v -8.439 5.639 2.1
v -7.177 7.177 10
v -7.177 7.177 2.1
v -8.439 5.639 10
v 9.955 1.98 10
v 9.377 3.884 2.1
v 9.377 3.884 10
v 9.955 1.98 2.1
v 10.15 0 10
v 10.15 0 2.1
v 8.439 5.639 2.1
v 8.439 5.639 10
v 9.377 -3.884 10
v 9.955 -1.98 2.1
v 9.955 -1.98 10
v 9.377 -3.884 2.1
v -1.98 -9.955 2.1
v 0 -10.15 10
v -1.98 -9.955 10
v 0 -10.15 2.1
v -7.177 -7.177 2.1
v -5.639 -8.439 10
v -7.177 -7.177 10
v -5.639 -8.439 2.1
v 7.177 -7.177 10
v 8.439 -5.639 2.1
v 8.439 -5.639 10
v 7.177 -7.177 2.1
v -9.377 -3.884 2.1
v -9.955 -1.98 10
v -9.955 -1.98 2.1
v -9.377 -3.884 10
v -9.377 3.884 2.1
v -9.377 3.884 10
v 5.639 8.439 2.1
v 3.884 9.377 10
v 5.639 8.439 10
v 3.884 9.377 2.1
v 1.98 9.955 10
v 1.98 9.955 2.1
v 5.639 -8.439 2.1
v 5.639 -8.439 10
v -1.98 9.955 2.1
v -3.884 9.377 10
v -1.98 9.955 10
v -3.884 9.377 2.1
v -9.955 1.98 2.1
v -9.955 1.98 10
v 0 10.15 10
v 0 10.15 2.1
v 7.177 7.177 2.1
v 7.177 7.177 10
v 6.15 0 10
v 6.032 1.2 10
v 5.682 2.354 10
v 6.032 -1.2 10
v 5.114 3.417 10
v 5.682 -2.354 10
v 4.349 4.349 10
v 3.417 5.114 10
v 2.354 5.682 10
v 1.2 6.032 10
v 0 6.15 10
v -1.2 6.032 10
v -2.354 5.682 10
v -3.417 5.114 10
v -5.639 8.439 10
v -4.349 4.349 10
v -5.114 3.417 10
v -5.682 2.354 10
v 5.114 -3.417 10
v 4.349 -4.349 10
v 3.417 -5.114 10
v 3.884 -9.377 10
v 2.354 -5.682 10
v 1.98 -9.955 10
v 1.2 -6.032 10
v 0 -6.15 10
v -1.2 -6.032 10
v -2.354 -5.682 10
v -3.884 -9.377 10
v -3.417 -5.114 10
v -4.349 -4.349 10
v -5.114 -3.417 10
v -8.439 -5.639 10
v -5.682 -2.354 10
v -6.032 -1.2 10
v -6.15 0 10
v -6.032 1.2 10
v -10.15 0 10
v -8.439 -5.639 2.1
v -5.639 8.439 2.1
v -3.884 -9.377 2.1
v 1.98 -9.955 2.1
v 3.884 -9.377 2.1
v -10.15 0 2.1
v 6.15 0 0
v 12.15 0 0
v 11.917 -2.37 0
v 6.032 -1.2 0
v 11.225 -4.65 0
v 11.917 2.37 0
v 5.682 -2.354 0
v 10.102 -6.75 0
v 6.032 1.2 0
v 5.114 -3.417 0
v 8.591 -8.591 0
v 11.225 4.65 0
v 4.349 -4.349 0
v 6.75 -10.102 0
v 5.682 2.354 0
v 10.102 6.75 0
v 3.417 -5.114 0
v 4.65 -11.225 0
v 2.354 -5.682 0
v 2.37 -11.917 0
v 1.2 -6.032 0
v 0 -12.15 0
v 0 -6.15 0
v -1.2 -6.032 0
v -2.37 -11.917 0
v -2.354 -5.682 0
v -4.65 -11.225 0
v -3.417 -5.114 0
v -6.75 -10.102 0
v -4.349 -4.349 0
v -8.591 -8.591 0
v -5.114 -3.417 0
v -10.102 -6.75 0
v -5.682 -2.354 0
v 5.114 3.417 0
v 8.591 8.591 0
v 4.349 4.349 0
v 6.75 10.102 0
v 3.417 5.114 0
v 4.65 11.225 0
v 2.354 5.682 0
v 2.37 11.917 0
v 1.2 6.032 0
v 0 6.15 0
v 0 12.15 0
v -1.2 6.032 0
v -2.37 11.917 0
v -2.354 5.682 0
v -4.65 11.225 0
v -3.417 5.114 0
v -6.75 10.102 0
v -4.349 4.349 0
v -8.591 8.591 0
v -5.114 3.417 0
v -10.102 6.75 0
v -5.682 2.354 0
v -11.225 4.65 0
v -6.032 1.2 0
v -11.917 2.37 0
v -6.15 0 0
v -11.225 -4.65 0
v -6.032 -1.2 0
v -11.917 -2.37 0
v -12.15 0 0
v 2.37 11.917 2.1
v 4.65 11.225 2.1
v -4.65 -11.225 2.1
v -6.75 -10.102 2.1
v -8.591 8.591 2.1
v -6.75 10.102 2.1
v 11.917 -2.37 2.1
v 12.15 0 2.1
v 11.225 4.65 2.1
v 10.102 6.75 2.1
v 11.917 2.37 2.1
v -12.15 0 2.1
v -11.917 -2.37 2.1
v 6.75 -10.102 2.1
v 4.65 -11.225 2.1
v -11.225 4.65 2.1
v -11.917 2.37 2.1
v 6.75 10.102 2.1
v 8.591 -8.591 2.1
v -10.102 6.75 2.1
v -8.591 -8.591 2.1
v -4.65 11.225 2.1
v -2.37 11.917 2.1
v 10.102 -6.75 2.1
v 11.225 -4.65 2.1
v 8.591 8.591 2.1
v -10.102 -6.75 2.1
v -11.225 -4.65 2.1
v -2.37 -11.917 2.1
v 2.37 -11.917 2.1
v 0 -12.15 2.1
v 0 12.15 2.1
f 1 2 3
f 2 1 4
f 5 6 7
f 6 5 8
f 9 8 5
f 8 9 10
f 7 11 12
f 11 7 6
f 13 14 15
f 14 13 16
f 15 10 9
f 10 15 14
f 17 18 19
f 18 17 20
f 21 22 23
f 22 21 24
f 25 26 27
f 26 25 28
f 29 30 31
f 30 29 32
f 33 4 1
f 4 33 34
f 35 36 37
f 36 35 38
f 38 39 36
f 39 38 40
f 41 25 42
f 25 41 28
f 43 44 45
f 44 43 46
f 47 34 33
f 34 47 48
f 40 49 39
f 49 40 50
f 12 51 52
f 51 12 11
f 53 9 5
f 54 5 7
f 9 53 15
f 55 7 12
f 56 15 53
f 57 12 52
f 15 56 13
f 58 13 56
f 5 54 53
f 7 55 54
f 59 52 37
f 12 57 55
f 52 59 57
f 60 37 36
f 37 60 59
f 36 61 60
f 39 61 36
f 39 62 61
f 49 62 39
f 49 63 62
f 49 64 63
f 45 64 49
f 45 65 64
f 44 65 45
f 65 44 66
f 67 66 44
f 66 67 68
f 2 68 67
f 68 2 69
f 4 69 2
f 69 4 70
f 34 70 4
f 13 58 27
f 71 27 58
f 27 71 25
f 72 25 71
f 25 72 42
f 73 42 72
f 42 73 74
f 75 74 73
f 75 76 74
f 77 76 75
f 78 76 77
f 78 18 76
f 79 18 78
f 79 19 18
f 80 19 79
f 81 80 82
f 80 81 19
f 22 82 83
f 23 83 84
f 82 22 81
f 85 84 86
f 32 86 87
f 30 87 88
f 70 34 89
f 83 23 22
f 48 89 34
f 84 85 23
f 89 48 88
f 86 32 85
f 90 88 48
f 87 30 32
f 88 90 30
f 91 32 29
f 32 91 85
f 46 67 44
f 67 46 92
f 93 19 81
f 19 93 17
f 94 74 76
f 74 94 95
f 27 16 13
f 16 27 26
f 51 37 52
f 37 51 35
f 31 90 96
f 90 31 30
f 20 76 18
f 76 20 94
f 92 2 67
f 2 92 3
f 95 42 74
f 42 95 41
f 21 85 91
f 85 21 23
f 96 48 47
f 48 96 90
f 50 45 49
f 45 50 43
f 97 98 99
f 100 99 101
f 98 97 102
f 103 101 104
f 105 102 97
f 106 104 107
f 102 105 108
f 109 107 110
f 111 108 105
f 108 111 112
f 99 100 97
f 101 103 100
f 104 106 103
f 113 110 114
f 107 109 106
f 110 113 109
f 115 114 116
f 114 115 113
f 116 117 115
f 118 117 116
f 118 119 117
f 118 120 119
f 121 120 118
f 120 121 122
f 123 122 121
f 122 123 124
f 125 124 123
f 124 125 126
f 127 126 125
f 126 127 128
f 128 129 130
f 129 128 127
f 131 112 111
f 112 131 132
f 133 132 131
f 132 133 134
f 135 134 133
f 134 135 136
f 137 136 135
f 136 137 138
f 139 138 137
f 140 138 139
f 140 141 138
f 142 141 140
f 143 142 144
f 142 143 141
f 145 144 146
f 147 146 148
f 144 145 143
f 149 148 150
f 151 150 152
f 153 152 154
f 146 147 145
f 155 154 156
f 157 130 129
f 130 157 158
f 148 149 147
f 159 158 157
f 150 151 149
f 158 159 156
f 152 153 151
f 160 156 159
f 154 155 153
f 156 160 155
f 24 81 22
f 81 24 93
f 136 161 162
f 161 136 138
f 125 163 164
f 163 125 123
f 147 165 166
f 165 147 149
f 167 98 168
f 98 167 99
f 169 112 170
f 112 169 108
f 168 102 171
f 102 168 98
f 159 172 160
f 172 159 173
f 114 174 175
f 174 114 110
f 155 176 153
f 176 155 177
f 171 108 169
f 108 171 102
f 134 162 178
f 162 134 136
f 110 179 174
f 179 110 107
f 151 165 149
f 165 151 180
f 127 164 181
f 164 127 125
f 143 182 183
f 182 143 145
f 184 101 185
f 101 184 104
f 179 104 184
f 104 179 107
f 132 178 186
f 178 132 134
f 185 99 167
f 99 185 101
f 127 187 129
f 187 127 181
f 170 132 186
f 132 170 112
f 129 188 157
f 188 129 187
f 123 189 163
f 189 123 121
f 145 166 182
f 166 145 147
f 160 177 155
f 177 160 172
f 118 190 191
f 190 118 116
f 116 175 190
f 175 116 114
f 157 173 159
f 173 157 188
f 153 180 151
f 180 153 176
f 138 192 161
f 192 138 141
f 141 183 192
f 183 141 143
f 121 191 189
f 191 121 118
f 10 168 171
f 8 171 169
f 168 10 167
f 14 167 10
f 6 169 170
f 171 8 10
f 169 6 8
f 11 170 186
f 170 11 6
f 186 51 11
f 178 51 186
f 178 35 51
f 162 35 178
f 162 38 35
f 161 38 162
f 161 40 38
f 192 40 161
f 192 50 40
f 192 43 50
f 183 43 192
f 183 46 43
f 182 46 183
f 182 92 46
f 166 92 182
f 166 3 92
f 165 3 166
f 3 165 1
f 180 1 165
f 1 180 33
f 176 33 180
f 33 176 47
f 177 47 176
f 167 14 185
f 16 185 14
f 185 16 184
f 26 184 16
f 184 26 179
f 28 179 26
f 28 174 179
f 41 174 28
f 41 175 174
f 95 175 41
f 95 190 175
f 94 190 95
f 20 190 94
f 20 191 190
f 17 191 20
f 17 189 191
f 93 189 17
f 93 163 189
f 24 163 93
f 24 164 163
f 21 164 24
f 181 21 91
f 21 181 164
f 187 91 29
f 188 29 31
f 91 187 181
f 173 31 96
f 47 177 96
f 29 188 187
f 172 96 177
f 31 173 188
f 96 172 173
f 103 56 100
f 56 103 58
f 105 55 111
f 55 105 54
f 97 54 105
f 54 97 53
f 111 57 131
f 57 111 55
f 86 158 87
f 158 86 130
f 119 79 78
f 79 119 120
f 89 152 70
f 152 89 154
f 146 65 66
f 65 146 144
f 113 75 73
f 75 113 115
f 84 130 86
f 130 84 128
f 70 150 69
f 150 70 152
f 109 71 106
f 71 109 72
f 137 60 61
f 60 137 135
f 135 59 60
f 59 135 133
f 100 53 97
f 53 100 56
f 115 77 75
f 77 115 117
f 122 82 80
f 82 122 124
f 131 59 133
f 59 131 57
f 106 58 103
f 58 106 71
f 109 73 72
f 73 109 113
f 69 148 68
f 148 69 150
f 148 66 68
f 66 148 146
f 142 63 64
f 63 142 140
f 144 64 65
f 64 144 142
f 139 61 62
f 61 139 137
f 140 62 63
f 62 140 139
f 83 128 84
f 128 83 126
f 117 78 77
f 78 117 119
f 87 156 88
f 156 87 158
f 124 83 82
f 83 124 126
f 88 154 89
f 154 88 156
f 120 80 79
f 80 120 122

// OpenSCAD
$fn = 32;

// ----------------------------------------------------------------------
// Spacer sleeve: 20.3 / 12.3 x 10 mm
// ----------------------------------------------------------------------

// --- parameters (mm) ---
sleeve_od = 20.3;         // outside diameter
sleeve_id = 12.3;         // shaft bore
sleeve_l = 10;            // sleeve length
flange_d = 24.3;          // collar diameter
flange_t = 1.5;           // collar thickness

module sleeve() {
  cylinder(h = sleeve_l, d = sleeve_od);
  cylinder(h = flange_t + 0.6, d = flange_d);
}

difference() {
  sleeve();
  translate([0, 0, -1]) cylinder(h = sleeve_l + 2, d = sleeve_id);
}
